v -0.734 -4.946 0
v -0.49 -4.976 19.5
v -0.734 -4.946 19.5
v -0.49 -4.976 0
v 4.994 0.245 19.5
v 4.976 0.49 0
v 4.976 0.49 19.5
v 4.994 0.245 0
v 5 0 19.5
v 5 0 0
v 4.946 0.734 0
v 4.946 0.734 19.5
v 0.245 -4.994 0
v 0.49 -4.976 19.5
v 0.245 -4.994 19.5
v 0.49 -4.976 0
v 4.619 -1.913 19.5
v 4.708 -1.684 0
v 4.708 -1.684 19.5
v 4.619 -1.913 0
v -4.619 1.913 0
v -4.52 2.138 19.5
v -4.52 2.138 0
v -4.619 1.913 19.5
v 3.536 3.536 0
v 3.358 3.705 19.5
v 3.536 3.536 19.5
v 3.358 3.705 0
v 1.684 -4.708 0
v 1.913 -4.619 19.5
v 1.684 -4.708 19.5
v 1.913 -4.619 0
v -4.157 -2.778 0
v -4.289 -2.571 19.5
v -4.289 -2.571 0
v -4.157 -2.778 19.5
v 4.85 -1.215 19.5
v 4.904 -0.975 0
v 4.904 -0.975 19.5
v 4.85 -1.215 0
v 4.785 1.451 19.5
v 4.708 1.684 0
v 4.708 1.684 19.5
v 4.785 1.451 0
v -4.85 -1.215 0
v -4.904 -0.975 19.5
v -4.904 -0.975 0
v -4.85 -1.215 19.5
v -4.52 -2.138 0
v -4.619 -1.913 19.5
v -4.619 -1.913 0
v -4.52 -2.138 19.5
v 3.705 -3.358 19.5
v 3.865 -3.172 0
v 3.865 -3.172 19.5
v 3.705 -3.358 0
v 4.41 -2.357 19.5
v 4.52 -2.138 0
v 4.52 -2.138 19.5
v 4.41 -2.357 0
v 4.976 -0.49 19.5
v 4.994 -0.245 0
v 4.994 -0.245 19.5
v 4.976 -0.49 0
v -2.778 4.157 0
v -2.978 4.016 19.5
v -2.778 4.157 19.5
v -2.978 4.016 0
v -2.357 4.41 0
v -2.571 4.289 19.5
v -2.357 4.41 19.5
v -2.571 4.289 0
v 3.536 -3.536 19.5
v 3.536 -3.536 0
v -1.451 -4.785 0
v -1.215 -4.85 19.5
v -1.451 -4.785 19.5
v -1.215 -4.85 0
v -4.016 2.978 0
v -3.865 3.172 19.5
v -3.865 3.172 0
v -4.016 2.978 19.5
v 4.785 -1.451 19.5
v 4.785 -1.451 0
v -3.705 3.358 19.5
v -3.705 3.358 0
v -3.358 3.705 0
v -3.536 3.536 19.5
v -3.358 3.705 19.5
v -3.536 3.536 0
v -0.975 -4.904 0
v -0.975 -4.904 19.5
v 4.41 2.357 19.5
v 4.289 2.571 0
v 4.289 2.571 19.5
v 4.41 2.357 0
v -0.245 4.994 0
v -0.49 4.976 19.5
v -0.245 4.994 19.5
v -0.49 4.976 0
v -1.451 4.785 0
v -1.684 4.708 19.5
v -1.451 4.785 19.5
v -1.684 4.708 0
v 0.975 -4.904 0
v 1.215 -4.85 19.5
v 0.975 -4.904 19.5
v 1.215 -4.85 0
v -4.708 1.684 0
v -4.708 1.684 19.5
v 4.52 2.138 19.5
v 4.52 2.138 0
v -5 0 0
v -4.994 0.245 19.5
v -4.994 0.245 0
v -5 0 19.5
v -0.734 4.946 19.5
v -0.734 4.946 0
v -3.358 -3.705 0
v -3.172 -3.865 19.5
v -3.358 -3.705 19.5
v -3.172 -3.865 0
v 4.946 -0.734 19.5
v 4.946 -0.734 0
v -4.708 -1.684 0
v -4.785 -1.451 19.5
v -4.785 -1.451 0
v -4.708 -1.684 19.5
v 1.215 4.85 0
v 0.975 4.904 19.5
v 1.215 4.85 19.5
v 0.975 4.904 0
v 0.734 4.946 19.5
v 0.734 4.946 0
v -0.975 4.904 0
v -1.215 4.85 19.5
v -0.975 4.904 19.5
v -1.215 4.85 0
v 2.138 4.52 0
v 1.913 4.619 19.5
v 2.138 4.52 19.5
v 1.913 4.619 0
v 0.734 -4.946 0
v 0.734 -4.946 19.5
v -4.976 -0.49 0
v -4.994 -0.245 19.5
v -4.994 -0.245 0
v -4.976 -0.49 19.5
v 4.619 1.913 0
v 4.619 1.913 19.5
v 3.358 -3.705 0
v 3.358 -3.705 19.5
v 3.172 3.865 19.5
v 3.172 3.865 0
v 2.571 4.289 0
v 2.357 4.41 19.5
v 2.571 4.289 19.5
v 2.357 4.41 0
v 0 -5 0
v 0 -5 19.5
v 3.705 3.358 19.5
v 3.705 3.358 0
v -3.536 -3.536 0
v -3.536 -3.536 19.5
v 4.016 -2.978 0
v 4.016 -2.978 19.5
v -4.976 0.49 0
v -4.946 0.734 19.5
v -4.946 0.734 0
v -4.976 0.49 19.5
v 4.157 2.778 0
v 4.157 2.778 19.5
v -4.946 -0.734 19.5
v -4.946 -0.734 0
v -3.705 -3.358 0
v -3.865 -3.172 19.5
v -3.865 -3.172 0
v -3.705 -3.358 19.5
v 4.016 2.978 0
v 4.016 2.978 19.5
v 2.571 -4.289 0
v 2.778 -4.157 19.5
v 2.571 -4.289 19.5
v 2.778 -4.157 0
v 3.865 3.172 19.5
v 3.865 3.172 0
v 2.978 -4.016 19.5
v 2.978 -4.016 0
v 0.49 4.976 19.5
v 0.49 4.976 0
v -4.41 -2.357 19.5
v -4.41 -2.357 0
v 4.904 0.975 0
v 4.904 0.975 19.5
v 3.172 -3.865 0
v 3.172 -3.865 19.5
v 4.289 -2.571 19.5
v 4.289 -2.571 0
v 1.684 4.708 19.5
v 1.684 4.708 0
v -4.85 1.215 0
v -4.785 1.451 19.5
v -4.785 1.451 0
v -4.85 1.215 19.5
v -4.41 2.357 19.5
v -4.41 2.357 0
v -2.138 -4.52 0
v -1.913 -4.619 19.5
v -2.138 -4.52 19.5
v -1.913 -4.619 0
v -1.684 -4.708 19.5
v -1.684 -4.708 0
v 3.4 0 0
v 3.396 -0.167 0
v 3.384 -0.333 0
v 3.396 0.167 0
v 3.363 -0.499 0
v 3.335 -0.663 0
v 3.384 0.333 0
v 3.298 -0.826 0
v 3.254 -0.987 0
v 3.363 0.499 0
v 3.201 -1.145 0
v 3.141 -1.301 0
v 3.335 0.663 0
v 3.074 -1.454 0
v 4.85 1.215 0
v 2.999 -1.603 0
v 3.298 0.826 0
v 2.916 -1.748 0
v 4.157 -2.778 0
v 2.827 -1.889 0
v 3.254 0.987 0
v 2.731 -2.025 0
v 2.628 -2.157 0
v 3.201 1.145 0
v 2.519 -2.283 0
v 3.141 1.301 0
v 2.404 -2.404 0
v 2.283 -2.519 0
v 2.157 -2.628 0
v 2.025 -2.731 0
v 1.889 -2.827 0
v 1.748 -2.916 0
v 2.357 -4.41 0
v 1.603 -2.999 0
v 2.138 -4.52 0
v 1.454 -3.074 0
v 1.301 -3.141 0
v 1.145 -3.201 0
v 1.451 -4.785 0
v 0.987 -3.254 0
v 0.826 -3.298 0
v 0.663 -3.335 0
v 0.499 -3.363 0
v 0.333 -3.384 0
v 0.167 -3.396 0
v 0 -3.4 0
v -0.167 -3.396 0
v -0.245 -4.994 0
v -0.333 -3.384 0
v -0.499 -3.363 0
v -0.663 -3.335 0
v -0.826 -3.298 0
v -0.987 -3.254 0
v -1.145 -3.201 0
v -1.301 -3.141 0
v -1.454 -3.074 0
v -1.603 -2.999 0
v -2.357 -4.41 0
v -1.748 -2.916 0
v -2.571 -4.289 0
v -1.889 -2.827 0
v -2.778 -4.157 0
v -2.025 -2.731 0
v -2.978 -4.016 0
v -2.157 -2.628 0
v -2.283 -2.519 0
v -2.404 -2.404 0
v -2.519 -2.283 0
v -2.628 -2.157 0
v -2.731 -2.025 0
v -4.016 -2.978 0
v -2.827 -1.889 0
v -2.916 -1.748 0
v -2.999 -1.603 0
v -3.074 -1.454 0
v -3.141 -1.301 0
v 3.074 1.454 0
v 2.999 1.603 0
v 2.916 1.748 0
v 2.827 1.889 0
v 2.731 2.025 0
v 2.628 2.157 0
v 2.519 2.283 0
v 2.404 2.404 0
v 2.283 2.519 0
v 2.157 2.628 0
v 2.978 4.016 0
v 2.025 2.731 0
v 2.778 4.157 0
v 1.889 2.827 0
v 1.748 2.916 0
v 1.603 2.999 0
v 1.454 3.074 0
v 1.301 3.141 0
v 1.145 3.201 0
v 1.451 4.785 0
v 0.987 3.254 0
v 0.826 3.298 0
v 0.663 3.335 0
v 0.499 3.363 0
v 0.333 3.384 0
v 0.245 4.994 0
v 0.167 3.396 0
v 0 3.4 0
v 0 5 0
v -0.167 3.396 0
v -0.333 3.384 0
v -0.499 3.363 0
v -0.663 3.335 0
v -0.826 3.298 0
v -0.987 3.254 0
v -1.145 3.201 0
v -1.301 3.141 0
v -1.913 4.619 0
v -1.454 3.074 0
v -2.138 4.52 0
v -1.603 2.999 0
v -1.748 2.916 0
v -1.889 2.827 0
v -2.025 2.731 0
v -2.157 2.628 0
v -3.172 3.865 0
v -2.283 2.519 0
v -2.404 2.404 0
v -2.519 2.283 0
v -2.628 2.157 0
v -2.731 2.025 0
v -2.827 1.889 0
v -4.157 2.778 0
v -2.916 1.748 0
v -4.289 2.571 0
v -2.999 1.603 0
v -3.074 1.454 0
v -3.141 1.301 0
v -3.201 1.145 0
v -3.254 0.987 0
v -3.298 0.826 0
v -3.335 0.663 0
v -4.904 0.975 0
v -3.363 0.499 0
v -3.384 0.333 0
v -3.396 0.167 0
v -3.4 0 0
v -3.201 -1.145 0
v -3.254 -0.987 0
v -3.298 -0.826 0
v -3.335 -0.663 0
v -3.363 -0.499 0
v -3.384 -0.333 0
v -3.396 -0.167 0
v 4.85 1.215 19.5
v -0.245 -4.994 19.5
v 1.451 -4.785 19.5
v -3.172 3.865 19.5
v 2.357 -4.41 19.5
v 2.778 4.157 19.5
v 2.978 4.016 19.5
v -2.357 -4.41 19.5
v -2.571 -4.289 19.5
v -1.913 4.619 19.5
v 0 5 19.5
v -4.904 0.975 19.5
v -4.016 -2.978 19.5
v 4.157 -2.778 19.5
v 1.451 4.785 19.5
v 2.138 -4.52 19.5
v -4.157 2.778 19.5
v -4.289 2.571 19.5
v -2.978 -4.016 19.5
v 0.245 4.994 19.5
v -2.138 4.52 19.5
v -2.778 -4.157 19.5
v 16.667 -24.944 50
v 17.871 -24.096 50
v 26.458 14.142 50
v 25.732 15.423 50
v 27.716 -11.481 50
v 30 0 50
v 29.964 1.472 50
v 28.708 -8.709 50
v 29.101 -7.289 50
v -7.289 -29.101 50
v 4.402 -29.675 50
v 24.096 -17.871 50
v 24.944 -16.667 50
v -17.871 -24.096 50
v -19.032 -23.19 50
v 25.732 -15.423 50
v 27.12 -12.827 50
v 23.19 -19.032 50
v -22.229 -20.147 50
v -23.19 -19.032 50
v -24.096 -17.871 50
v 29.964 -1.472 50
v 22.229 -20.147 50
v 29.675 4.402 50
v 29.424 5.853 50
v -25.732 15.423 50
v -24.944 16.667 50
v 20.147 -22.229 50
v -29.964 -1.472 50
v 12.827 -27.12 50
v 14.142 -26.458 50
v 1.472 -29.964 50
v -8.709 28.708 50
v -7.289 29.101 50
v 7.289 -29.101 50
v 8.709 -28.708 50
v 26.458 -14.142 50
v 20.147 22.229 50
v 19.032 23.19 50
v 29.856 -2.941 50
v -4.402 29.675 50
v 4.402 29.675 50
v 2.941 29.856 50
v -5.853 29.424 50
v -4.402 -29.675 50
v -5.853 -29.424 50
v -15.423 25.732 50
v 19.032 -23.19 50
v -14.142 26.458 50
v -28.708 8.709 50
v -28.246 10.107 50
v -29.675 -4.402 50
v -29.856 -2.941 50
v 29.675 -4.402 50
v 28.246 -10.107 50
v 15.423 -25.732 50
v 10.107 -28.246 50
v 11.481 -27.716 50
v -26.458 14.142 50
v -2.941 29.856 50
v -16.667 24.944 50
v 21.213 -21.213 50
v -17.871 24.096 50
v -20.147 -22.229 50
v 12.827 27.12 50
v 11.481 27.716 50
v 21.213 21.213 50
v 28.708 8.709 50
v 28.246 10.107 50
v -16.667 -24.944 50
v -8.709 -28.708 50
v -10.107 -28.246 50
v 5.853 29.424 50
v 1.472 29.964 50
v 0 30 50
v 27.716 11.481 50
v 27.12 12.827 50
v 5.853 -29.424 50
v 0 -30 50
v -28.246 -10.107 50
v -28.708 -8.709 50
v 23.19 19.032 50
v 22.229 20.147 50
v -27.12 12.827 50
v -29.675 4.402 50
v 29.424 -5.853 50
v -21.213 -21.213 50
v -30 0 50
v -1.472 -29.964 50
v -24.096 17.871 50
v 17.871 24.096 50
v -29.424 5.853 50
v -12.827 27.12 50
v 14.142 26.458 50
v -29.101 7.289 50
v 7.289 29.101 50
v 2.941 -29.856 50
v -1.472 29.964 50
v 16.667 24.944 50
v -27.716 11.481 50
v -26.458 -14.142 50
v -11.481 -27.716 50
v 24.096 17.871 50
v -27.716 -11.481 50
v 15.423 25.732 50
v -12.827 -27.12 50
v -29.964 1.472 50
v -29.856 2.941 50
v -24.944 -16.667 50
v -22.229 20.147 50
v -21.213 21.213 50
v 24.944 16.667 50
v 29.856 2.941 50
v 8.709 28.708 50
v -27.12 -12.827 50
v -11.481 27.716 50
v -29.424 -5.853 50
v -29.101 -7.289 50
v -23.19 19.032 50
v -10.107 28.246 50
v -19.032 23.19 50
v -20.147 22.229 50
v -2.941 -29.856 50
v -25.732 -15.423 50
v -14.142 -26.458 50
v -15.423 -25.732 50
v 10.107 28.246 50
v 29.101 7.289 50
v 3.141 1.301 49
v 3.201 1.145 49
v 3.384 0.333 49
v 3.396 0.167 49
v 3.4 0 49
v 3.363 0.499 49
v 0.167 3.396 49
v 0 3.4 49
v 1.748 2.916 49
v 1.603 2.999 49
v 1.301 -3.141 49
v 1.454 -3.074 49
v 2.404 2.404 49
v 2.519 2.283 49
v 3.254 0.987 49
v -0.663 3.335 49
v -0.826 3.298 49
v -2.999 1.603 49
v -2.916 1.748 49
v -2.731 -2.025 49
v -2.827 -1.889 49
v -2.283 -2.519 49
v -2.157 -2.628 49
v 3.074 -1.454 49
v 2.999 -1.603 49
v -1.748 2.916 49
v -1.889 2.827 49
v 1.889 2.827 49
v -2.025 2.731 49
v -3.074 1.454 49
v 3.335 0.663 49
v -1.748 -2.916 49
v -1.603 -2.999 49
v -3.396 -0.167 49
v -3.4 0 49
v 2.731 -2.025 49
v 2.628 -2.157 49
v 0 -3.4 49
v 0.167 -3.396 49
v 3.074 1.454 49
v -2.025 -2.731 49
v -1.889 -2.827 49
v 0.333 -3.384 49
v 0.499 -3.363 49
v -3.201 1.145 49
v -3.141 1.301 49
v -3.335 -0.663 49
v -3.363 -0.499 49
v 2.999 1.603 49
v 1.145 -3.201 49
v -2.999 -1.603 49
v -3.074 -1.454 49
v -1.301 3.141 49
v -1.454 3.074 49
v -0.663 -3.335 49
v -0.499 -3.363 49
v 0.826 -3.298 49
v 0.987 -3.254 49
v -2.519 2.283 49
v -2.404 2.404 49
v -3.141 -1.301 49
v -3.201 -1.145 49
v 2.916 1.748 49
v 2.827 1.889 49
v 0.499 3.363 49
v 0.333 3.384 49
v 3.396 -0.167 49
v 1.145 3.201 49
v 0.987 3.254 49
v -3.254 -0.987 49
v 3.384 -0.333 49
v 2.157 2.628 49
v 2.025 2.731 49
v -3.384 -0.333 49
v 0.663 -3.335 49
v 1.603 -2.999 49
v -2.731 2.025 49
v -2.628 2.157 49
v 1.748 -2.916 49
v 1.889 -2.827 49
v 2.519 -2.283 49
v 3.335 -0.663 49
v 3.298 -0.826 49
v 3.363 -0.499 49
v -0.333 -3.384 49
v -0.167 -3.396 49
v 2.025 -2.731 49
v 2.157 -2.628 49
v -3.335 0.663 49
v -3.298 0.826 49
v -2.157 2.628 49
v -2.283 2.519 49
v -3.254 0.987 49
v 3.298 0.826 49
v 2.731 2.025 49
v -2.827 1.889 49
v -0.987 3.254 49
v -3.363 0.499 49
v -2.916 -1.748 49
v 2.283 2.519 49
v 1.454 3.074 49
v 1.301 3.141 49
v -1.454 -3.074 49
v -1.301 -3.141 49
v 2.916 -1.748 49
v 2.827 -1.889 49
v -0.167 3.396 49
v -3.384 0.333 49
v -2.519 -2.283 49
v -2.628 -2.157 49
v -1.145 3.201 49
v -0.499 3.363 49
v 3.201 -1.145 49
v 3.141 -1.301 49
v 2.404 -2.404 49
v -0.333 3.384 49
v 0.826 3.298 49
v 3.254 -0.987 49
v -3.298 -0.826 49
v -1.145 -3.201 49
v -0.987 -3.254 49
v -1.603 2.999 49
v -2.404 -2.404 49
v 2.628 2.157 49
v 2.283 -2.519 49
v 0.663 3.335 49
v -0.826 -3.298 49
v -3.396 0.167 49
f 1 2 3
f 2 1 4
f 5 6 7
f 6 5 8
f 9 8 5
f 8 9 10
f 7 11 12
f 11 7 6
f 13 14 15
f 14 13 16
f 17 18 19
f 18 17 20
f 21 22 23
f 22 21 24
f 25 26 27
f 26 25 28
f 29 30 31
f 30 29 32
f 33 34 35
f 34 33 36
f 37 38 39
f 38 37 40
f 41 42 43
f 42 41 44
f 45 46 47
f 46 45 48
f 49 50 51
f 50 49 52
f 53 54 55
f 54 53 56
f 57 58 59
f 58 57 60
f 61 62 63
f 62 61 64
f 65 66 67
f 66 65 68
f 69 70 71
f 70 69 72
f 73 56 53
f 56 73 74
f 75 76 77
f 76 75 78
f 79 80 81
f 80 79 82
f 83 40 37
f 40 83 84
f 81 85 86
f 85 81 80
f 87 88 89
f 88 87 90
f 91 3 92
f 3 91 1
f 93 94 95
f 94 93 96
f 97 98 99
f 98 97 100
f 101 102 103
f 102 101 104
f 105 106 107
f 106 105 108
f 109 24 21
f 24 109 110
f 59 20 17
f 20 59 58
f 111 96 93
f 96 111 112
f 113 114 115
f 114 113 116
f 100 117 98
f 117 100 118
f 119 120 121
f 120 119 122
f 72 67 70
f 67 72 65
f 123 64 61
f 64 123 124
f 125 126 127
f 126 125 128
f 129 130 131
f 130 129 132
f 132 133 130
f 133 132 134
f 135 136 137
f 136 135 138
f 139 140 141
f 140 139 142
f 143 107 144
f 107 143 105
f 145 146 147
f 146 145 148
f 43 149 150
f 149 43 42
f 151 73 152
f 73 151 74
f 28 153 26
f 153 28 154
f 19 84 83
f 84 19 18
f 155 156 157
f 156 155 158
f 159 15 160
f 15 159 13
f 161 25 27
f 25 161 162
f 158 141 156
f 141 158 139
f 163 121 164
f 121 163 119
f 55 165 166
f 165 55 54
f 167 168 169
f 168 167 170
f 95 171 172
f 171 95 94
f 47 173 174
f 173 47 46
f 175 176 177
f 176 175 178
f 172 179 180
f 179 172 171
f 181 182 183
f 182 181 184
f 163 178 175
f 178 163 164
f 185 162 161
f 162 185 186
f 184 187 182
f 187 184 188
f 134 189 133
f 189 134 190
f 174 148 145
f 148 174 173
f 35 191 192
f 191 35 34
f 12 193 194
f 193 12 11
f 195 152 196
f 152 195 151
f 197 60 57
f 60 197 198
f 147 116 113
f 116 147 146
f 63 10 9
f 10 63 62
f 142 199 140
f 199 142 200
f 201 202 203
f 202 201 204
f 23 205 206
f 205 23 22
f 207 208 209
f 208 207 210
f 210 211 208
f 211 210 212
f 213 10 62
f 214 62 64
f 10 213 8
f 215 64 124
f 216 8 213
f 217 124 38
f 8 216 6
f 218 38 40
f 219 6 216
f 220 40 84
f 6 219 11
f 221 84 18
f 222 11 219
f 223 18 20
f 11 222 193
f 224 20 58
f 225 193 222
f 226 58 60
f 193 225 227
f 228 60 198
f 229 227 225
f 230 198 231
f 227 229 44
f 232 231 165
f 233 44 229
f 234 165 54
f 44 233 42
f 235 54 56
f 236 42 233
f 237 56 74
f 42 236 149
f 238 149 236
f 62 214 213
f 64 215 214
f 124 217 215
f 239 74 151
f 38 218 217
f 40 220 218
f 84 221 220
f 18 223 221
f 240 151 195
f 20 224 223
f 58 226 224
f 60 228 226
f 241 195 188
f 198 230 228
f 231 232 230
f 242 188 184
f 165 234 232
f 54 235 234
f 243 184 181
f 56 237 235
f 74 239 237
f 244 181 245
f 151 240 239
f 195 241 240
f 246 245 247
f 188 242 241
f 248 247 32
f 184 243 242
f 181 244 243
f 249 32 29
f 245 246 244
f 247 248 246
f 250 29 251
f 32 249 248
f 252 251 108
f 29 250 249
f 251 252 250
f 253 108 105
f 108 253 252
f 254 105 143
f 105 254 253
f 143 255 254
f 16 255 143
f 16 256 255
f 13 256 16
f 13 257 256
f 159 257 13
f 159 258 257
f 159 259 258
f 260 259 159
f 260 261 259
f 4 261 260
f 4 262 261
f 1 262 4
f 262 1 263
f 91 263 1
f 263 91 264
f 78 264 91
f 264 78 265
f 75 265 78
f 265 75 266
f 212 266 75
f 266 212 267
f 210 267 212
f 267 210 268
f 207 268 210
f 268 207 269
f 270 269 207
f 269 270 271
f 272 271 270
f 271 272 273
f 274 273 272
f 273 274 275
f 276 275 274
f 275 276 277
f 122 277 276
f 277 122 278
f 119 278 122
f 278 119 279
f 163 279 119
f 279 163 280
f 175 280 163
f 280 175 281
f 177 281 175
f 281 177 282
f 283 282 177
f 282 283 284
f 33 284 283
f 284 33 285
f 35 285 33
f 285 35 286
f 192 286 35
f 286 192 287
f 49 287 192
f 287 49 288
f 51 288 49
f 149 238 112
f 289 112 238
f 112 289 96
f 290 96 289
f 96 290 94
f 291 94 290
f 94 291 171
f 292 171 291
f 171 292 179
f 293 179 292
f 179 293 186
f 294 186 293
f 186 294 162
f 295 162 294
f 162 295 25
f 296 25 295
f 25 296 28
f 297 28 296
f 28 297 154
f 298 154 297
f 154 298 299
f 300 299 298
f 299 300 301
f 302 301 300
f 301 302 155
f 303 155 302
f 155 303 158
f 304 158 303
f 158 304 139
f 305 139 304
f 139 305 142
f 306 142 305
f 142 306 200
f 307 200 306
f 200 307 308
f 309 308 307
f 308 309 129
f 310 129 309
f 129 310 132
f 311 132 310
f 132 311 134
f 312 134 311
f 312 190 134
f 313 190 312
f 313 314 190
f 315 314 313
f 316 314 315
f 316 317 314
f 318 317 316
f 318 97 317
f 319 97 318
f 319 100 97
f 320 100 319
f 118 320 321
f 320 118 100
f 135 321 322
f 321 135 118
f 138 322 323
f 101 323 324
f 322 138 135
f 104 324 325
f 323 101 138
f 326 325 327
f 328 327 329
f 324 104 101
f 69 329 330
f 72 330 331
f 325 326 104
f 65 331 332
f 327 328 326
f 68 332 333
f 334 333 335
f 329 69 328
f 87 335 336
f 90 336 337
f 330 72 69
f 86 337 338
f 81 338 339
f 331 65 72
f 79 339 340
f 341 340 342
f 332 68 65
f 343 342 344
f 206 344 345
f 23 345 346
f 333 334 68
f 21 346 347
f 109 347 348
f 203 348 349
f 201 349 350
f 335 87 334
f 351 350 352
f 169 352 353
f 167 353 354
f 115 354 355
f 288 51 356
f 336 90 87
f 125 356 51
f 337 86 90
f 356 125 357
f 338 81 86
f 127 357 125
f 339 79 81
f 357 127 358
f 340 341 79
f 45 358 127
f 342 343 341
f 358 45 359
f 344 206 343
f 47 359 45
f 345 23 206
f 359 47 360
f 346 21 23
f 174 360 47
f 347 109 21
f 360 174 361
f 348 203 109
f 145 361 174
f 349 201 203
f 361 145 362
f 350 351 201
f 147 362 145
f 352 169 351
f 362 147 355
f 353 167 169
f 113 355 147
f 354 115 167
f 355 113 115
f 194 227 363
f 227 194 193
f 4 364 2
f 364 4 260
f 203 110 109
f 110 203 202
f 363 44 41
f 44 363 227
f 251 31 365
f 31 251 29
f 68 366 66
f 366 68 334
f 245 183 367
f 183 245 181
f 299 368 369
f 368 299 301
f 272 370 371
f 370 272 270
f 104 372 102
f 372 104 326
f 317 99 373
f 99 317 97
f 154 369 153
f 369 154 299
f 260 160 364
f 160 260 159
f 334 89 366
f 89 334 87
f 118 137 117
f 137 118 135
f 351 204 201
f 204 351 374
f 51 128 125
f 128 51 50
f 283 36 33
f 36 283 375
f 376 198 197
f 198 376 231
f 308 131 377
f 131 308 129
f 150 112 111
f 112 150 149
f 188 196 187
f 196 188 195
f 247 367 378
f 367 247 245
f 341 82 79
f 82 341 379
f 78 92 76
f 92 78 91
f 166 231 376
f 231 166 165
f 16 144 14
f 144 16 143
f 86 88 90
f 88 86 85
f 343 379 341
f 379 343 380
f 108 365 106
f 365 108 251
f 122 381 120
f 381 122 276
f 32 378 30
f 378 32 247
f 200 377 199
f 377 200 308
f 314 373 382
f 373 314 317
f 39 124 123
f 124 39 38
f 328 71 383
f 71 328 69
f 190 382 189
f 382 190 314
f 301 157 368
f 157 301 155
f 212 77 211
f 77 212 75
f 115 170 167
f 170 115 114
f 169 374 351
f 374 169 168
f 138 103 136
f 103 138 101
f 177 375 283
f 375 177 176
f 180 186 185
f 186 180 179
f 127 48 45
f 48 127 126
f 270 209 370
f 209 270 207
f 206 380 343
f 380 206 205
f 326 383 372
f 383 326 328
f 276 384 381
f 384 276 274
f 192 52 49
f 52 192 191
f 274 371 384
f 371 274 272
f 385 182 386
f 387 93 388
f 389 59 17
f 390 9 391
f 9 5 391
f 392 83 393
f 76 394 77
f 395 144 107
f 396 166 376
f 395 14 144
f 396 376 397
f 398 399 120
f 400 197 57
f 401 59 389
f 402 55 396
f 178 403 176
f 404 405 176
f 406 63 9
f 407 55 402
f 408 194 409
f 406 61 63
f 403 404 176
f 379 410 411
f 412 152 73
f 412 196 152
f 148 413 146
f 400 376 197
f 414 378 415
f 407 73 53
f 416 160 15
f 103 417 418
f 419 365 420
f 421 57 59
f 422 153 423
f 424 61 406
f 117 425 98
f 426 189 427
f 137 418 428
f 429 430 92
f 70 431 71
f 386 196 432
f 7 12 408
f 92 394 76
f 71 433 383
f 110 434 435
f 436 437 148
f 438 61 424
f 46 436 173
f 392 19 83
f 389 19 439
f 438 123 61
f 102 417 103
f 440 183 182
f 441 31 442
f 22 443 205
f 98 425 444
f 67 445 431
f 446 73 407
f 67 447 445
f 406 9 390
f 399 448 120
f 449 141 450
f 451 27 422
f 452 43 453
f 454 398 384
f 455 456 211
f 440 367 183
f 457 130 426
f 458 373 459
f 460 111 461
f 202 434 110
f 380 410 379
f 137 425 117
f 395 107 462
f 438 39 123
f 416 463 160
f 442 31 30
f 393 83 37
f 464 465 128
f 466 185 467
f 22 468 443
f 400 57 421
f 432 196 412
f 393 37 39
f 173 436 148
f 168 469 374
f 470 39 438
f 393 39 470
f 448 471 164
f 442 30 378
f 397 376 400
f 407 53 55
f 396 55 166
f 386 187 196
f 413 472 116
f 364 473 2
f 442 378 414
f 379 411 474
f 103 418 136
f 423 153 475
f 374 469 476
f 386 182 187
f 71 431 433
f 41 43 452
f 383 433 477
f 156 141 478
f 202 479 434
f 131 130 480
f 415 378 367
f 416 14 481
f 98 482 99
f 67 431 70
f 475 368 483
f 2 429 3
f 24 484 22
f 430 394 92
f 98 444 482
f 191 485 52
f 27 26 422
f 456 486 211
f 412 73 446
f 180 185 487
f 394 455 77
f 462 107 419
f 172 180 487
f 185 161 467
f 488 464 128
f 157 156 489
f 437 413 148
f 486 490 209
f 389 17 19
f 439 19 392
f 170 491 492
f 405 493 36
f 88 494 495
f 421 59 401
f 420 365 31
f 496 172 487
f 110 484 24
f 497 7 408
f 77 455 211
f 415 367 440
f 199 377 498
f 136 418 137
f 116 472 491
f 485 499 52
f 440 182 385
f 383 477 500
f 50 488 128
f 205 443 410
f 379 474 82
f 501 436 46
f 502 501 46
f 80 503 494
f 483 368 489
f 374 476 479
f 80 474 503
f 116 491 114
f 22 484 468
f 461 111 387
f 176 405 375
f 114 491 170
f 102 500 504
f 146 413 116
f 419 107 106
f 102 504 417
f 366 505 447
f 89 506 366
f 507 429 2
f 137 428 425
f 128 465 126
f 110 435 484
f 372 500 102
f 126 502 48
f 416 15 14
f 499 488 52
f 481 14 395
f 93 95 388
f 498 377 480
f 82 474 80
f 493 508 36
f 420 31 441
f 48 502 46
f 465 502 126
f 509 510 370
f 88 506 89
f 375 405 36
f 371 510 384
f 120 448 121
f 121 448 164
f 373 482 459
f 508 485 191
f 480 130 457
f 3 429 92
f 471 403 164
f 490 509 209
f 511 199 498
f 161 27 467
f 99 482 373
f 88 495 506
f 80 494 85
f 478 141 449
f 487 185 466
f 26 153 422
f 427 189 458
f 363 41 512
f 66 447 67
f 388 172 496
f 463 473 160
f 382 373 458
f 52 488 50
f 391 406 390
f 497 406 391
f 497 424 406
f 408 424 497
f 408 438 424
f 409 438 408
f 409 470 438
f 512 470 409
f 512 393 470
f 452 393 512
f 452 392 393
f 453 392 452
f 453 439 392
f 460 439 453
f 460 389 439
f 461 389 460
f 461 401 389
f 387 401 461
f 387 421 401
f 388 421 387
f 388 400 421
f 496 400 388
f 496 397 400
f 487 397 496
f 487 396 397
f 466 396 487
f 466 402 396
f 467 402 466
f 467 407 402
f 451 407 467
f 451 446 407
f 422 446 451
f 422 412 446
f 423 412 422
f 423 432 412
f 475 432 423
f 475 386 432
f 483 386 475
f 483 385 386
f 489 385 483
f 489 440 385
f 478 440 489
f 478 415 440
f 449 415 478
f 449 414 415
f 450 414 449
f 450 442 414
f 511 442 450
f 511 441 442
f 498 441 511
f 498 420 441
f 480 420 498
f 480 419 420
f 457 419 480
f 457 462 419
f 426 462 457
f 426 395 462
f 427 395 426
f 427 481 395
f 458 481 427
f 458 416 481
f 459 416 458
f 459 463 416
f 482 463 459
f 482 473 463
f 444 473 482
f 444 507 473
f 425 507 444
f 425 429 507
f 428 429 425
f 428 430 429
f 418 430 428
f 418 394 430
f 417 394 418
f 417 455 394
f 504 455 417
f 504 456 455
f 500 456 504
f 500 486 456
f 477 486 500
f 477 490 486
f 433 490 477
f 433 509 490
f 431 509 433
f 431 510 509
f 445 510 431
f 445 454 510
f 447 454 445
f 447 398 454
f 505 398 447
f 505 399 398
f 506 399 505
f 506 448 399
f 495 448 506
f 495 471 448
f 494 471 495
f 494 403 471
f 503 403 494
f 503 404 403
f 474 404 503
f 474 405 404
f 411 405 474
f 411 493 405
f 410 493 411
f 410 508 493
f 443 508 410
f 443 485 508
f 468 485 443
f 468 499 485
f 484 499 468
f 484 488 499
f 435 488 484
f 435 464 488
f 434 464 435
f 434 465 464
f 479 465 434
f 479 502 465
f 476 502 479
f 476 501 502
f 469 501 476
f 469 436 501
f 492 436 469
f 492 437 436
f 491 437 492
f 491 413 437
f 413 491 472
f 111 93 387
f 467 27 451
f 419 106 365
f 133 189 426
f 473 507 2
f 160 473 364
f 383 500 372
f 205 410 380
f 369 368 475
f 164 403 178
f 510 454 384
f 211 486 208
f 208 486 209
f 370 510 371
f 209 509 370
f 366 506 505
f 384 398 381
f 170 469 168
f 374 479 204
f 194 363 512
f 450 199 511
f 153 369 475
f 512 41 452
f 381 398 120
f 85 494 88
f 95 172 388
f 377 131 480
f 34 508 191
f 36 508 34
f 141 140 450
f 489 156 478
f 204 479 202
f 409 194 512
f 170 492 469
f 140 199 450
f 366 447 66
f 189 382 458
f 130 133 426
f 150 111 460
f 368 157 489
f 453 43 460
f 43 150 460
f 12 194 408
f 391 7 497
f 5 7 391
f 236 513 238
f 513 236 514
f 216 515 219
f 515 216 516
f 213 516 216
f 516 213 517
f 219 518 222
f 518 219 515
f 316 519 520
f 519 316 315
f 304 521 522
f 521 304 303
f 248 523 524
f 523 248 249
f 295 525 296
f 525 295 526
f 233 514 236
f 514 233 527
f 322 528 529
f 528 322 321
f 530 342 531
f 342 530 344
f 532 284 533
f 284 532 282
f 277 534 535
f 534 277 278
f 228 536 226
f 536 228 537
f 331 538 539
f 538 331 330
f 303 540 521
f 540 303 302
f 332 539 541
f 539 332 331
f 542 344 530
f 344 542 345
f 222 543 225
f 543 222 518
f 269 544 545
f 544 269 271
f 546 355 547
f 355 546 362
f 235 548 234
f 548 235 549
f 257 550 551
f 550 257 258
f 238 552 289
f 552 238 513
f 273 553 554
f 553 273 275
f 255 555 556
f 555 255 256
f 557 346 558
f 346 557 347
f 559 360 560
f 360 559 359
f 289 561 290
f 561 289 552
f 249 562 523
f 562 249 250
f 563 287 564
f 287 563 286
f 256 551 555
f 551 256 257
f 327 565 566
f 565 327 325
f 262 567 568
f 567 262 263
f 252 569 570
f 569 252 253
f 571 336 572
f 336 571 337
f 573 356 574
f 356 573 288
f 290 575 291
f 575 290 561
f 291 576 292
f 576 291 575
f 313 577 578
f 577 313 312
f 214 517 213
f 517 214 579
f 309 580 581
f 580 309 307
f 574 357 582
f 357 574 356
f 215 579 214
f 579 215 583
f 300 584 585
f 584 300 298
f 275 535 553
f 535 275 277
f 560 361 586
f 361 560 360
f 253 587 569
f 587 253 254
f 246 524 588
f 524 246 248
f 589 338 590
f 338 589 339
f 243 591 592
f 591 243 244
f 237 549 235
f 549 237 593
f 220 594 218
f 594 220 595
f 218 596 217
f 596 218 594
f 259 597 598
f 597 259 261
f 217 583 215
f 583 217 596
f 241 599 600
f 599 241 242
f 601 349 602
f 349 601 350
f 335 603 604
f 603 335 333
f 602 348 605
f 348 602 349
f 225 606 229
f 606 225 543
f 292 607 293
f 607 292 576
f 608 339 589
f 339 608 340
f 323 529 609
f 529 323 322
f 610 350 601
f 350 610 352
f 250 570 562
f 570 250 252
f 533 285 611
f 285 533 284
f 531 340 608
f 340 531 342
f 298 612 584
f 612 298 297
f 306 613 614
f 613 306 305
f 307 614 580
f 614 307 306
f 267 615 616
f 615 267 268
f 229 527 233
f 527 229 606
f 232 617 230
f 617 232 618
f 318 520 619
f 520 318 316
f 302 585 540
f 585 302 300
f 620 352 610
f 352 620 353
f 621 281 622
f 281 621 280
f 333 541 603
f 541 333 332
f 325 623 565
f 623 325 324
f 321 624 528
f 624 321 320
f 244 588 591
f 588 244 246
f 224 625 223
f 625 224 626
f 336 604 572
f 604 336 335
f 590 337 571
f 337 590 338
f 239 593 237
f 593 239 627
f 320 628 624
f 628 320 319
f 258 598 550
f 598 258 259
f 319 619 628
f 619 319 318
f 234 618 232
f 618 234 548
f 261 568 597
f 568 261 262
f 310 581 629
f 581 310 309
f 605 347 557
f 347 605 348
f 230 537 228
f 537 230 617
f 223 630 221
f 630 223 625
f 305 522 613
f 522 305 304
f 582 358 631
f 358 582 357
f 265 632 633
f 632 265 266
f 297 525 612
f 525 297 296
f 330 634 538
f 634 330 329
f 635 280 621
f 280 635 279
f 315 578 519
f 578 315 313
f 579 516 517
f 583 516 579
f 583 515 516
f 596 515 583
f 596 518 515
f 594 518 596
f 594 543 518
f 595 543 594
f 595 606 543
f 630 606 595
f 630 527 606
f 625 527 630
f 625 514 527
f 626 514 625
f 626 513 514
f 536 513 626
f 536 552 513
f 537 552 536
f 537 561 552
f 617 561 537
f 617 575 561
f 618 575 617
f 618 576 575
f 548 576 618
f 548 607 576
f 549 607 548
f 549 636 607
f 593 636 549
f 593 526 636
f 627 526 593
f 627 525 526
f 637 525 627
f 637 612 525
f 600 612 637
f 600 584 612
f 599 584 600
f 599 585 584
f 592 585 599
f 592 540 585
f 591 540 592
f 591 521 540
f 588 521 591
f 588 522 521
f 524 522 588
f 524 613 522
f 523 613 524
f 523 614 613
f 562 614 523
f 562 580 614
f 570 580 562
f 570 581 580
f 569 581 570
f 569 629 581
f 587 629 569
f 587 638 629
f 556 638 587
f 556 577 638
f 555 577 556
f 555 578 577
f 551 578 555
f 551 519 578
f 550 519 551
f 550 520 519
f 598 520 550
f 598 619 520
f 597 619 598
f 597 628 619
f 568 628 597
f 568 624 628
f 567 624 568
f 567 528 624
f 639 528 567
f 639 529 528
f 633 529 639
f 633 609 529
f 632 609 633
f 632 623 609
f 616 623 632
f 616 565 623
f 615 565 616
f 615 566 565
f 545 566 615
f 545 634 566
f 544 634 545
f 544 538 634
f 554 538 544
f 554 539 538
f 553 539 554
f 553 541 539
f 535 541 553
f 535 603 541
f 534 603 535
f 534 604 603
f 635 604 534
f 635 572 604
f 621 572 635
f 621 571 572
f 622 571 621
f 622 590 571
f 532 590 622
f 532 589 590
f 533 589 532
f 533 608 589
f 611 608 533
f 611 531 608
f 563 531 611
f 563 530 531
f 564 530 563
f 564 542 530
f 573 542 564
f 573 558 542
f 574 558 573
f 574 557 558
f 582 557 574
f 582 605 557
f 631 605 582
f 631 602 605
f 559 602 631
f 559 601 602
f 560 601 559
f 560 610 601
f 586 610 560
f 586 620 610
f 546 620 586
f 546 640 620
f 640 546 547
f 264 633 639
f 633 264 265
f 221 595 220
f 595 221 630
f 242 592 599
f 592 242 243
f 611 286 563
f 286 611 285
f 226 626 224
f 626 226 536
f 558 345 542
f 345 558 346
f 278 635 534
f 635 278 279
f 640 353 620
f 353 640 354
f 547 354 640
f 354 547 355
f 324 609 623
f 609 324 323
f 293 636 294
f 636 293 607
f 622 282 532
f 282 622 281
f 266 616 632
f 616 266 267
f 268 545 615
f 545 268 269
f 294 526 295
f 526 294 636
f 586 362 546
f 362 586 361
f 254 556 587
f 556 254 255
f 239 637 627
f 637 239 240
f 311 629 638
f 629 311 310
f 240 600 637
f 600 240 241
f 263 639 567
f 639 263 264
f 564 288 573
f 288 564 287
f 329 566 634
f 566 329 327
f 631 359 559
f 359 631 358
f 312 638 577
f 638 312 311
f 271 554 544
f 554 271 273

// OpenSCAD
// Lab funnel - printed upright, wide opening at top
// Spout: z = 0 to 20 (10 mm OD, 6.8 mm bore)
// Cone:  z = 20 to 50 (10 mm OD at base, 60 mm OD at rim, 1.6 mm wall)

$fn = 128;
wall = 1.6;
bore = 10 - 2 * wall;     // 6.8 mm bore
eps  = 0.5;               // overlap for clean booleans

difference() {
    union() {
        // Spout
        cylinder(h = 20, d = 10);
        // Cone (starts slightly inside spout to fuse)
        translate([0, 0, 19.5])
            cylinder(h = 30.5, d1 = 10, d2 = 60);
    }
    // Through-bore from bottom up to just below rim
    translate([0, 0, -eps])
        cylinder(h = 49.5, d = bore);
}
